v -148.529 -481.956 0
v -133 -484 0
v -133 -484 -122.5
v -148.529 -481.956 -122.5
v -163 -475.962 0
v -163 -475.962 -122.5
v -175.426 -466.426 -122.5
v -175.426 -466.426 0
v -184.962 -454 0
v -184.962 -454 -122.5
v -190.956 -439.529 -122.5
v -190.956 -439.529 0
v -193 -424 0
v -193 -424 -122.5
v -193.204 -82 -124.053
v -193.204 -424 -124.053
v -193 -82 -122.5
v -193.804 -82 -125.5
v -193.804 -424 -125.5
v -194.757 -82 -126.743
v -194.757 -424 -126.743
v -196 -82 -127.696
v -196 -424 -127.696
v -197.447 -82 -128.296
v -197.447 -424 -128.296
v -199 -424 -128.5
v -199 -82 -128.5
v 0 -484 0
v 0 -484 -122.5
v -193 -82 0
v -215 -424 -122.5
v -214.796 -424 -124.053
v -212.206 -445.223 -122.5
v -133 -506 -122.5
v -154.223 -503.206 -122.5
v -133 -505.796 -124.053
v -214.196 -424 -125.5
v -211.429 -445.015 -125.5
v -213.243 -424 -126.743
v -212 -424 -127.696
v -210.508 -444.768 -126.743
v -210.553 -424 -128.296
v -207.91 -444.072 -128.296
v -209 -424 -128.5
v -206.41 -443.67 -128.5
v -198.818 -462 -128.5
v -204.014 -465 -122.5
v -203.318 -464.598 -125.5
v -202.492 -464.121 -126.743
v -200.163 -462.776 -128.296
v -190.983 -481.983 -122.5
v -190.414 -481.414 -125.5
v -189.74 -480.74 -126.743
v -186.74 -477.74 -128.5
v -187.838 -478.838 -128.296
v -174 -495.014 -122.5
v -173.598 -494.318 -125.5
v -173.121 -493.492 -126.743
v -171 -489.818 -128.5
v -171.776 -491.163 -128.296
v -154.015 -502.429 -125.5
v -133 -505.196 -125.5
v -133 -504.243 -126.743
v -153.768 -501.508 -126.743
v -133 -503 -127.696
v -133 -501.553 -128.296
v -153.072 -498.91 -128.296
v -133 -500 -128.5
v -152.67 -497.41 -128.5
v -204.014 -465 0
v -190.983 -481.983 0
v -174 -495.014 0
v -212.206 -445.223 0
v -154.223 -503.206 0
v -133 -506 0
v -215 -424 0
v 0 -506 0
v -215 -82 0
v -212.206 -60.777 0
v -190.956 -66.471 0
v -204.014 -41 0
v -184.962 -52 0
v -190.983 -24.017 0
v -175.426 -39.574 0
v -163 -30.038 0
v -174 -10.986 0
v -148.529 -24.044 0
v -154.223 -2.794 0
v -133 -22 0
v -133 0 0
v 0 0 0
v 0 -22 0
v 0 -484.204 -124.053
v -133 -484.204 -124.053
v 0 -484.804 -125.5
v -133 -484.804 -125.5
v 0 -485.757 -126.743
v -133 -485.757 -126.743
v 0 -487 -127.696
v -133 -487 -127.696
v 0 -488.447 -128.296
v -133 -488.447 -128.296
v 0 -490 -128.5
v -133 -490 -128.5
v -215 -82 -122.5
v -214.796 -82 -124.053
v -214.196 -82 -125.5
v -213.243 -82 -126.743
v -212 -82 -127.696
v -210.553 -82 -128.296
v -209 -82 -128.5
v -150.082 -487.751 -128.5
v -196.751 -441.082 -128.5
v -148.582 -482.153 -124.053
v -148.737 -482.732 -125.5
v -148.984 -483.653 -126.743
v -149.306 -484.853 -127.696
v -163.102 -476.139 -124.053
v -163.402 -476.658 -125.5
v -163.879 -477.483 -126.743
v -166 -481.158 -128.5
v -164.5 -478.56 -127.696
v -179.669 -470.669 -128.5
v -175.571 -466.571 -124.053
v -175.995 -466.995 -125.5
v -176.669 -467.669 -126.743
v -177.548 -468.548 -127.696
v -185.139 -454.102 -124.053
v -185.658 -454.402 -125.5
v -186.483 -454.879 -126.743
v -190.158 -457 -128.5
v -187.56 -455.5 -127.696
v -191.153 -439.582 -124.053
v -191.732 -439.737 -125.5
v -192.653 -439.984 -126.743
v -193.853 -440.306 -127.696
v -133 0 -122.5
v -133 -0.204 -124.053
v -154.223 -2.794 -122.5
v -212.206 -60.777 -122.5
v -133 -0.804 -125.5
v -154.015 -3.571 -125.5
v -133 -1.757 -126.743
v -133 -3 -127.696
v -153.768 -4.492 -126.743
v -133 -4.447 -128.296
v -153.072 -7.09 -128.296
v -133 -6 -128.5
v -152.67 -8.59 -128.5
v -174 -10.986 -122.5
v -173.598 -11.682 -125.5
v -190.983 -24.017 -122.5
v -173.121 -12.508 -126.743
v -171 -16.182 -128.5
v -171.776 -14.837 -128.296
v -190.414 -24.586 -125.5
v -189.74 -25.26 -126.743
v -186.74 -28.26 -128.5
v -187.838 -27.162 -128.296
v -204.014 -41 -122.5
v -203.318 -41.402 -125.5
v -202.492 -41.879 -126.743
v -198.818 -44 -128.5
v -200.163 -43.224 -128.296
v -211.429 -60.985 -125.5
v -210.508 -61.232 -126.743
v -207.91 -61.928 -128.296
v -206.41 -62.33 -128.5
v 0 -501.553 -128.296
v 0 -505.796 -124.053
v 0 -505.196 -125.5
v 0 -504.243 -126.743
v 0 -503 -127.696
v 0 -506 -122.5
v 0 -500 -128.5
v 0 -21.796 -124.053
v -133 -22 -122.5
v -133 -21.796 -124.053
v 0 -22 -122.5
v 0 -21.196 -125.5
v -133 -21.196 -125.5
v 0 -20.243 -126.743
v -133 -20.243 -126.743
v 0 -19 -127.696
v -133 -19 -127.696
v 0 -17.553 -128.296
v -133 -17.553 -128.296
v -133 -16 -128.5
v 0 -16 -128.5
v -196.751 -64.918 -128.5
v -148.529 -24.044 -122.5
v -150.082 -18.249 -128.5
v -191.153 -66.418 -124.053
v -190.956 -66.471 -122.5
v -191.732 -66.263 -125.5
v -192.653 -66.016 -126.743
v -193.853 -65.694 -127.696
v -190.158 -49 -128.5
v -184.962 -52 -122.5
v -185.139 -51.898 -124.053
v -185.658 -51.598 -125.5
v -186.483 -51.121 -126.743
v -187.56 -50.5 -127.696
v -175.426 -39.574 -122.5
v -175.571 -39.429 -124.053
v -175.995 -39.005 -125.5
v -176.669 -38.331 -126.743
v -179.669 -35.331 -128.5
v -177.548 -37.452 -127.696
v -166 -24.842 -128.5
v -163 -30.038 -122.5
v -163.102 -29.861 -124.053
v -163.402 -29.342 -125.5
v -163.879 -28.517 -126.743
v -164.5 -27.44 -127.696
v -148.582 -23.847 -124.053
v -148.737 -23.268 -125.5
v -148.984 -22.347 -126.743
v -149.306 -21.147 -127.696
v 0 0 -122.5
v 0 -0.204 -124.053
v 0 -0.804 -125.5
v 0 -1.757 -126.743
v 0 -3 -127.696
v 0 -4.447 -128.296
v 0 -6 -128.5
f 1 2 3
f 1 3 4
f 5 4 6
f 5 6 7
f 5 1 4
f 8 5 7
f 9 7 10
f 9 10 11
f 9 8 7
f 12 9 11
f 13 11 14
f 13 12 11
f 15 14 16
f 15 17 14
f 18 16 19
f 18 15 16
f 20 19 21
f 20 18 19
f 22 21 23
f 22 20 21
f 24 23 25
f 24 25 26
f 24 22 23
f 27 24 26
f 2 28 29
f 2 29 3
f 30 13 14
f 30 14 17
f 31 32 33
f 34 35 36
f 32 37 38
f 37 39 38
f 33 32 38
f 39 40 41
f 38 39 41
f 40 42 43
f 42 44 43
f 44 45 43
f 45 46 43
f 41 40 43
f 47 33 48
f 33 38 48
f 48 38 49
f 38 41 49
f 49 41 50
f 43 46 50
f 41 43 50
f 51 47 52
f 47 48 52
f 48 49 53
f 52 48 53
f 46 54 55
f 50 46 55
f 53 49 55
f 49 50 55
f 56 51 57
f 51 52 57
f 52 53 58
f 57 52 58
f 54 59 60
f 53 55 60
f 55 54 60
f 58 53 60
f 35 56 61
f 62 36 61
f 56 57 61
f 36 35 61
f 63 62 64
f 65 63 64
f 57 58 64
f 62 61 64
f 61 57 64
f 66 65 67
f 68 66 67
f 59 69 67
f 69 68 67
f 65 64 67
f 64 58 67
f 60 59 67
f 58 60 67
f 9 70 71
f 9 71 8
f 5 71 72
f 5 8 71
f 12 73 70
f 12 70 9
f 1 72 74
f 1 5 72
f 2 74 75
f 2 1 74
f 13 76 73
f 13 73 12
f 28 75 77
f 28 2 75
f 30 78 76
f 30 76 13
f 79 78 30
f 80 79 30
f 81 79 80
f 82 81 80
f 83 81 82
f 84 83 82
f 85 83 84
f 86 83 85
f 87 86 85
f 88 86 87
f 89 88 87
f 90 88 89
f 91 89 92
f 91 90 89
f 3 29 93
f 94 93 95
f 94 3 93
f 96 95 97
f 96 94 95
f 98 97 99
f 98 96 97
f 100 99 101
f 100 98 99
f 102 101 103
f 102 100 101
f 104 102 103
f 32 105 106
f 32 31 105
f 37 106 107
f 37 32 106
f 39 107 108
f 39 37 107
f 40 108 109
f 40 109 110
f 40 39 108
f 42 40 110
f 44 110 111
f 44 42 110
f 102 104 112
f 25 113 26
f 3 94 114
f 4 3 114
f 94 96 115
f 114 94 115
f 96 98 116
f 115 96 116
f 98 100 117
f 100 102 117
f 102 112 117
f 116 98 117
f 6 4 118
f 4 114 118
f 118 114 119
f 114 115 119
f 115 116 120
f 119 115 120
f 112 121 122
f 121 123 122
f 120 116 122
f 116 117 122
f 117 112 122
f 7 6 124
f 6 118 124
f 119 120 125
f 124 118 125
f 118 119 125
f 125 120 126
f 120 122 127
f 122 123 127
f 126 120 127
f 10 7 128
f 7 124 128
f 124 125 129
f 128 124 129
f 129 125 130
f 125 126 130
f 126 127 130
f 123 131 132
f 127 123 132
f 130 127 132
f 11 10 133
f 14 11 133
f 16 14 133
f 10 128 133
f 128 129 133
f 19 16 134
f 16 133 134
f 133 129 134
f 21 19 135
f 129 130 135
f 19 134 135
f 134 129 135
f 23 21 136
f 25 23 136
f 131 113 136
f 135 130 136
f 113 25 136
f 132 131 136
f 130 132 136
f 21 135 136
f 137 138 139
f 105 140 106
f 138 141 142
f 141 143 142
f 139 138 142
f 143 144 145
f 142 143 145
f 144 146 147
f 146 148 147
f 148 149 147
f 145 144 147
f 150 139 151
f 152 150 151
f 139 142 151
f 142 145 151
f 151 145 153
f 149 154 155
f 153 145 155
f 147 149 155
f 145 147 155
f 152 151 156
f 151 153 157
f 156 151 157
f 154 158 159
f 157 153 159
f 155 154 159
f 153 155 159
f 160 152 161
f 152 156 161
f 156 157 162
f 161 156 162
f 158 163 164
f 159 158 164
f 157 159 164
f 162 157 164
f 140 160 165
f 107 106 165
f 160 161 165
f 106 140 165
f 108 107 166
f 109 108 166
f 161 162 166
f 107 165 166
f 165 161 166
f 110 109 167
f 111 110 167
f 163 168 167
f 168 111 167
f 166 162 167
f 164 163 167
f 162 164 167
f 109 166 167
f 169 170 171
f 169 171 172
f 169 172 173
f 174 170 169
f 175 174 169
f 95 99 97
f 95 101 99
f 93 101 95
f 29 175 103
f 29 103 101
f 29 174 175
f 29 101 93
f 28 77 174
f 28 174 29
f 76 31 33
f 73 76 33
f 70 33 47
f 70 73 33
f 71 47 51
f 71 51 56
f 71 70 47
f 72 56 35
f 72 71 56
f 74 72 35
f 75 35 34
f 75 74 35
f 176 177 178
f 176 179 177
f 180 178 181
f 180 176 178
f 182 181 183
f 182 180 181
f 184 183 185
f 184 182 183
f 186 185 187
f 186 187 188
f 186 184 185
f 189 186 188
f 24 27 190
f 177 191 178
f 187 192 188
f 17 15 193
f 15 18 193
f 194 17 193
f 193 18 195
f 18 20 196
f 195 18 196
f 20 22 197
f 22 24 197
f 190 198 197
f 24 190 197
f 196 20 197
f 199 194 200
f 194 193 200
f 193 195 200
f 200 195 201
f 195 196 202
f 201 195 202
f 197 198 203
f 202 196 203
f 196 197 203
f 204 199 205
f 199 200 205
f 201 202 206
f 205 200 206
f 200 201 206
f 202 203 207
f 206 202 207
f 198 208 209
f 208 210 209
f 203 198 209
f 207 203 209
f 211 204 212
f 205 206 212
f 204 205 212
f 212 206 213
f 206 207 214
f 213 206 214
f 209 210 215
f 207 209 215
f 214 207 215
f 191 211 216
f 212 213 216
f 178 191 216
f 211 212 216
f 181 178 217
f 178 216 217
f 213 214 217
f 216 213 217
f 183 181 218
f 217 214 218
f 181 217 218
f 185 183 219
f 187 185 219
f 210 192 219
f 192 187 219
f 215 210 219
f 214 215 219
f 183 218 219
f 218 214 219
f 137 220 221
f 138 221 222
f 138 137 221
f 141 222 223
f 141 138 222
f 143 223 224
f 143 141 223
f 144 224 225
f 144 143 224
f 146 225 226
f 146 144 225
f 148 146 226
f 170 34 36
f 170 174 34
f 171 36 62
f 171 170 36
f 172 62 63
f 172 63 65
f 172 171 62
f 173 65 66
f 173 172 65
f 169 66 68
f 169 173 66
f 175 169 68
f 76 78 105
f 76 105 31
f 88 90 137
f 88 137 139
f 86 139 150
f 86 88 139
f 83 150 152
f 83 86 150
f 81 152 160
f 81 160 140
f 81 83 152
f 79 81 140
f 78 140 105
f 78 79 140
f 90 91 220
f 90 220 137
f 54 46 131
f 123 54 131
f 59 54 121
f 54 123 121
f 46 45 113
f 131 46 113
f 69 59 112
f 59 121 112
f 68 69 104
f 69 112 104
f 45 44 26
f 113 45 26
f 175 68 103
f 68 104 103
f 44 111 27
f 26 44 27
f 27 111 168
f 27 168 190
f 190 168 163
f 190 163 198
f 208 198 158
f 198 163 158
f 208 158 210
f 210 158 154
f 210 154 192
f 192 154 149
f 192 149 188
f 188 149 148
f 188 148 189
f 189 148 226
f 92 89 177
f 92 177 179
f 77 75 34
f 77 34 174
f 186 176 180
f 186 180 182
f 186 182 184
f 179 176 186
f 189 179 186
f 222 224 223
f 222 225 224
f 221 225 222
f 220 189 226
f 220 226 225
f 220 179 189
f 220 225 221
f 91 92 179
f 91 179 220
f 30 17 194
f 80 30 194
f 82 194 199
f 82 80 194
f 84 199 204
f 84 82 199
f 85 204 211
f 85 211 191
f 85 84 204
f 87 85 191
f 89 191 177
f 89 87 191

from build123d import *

# Parameters (mm, degrees)
BOSS_EXTRU_1_DEPTH = 128.5
CONG_1_R           = 6


with BuildPart() as part:
    # Esquisse1 → Boss.-Extru.1 (new body)
    with BuildSketch(Plane.XY):
        with BuildLine():
            Line((-133, -22), (0, -22))
            Line((0, -22), (0, 0))
            Line((0, 0), (-133, 0))
            ThreePointArc((-133, 0), (-190.982756057, -24.017243943), (-215, -82))
            Line((-215, -82), (-215, -424))
            ThreePointArc((-215, -424), (-190.982756057, -481.982756057), (-133, -506))
            Line((-133, -506), (0, -506))
            Line((0, -506), (0, -484))
            Line((0, -484), (-133, -484))
            ThreePointArc((-133, -484), (-175.426406871, -466.426406871), (-193, -424))
            Line((-193, -424), (-193, -82))
            ThreePointArc((-193, -82), (-175.426406871, -39.573593129), (-133, -22))
        make_face()
    extrude(amount=-BOSS_EXTRU_1_DEPTH)

    # Congé1
    cong_1_edges = [part.edges().sort_by_distance(p)[0] for p in [
        (-66.5, 0, -128.5),
        (-190.982756057, -24.017243943, -128.5),
        (-215, -253, -128.5),
        (-190.982756057, -481.982756057, -128.5),
        (-66.5, -506, -128.5),
        (-66.5, -484, -128.5),
        (-175.426406871, -466.426406871, -128.5),
        (-193, -253, -128.5),
        (-175.426406871, -39.573593129, -128.5),
        (-66.5, -22, -128.5),
    ]]
    fillet(cong_1_edges, radius=CONG_1_R)


solid = part.part
